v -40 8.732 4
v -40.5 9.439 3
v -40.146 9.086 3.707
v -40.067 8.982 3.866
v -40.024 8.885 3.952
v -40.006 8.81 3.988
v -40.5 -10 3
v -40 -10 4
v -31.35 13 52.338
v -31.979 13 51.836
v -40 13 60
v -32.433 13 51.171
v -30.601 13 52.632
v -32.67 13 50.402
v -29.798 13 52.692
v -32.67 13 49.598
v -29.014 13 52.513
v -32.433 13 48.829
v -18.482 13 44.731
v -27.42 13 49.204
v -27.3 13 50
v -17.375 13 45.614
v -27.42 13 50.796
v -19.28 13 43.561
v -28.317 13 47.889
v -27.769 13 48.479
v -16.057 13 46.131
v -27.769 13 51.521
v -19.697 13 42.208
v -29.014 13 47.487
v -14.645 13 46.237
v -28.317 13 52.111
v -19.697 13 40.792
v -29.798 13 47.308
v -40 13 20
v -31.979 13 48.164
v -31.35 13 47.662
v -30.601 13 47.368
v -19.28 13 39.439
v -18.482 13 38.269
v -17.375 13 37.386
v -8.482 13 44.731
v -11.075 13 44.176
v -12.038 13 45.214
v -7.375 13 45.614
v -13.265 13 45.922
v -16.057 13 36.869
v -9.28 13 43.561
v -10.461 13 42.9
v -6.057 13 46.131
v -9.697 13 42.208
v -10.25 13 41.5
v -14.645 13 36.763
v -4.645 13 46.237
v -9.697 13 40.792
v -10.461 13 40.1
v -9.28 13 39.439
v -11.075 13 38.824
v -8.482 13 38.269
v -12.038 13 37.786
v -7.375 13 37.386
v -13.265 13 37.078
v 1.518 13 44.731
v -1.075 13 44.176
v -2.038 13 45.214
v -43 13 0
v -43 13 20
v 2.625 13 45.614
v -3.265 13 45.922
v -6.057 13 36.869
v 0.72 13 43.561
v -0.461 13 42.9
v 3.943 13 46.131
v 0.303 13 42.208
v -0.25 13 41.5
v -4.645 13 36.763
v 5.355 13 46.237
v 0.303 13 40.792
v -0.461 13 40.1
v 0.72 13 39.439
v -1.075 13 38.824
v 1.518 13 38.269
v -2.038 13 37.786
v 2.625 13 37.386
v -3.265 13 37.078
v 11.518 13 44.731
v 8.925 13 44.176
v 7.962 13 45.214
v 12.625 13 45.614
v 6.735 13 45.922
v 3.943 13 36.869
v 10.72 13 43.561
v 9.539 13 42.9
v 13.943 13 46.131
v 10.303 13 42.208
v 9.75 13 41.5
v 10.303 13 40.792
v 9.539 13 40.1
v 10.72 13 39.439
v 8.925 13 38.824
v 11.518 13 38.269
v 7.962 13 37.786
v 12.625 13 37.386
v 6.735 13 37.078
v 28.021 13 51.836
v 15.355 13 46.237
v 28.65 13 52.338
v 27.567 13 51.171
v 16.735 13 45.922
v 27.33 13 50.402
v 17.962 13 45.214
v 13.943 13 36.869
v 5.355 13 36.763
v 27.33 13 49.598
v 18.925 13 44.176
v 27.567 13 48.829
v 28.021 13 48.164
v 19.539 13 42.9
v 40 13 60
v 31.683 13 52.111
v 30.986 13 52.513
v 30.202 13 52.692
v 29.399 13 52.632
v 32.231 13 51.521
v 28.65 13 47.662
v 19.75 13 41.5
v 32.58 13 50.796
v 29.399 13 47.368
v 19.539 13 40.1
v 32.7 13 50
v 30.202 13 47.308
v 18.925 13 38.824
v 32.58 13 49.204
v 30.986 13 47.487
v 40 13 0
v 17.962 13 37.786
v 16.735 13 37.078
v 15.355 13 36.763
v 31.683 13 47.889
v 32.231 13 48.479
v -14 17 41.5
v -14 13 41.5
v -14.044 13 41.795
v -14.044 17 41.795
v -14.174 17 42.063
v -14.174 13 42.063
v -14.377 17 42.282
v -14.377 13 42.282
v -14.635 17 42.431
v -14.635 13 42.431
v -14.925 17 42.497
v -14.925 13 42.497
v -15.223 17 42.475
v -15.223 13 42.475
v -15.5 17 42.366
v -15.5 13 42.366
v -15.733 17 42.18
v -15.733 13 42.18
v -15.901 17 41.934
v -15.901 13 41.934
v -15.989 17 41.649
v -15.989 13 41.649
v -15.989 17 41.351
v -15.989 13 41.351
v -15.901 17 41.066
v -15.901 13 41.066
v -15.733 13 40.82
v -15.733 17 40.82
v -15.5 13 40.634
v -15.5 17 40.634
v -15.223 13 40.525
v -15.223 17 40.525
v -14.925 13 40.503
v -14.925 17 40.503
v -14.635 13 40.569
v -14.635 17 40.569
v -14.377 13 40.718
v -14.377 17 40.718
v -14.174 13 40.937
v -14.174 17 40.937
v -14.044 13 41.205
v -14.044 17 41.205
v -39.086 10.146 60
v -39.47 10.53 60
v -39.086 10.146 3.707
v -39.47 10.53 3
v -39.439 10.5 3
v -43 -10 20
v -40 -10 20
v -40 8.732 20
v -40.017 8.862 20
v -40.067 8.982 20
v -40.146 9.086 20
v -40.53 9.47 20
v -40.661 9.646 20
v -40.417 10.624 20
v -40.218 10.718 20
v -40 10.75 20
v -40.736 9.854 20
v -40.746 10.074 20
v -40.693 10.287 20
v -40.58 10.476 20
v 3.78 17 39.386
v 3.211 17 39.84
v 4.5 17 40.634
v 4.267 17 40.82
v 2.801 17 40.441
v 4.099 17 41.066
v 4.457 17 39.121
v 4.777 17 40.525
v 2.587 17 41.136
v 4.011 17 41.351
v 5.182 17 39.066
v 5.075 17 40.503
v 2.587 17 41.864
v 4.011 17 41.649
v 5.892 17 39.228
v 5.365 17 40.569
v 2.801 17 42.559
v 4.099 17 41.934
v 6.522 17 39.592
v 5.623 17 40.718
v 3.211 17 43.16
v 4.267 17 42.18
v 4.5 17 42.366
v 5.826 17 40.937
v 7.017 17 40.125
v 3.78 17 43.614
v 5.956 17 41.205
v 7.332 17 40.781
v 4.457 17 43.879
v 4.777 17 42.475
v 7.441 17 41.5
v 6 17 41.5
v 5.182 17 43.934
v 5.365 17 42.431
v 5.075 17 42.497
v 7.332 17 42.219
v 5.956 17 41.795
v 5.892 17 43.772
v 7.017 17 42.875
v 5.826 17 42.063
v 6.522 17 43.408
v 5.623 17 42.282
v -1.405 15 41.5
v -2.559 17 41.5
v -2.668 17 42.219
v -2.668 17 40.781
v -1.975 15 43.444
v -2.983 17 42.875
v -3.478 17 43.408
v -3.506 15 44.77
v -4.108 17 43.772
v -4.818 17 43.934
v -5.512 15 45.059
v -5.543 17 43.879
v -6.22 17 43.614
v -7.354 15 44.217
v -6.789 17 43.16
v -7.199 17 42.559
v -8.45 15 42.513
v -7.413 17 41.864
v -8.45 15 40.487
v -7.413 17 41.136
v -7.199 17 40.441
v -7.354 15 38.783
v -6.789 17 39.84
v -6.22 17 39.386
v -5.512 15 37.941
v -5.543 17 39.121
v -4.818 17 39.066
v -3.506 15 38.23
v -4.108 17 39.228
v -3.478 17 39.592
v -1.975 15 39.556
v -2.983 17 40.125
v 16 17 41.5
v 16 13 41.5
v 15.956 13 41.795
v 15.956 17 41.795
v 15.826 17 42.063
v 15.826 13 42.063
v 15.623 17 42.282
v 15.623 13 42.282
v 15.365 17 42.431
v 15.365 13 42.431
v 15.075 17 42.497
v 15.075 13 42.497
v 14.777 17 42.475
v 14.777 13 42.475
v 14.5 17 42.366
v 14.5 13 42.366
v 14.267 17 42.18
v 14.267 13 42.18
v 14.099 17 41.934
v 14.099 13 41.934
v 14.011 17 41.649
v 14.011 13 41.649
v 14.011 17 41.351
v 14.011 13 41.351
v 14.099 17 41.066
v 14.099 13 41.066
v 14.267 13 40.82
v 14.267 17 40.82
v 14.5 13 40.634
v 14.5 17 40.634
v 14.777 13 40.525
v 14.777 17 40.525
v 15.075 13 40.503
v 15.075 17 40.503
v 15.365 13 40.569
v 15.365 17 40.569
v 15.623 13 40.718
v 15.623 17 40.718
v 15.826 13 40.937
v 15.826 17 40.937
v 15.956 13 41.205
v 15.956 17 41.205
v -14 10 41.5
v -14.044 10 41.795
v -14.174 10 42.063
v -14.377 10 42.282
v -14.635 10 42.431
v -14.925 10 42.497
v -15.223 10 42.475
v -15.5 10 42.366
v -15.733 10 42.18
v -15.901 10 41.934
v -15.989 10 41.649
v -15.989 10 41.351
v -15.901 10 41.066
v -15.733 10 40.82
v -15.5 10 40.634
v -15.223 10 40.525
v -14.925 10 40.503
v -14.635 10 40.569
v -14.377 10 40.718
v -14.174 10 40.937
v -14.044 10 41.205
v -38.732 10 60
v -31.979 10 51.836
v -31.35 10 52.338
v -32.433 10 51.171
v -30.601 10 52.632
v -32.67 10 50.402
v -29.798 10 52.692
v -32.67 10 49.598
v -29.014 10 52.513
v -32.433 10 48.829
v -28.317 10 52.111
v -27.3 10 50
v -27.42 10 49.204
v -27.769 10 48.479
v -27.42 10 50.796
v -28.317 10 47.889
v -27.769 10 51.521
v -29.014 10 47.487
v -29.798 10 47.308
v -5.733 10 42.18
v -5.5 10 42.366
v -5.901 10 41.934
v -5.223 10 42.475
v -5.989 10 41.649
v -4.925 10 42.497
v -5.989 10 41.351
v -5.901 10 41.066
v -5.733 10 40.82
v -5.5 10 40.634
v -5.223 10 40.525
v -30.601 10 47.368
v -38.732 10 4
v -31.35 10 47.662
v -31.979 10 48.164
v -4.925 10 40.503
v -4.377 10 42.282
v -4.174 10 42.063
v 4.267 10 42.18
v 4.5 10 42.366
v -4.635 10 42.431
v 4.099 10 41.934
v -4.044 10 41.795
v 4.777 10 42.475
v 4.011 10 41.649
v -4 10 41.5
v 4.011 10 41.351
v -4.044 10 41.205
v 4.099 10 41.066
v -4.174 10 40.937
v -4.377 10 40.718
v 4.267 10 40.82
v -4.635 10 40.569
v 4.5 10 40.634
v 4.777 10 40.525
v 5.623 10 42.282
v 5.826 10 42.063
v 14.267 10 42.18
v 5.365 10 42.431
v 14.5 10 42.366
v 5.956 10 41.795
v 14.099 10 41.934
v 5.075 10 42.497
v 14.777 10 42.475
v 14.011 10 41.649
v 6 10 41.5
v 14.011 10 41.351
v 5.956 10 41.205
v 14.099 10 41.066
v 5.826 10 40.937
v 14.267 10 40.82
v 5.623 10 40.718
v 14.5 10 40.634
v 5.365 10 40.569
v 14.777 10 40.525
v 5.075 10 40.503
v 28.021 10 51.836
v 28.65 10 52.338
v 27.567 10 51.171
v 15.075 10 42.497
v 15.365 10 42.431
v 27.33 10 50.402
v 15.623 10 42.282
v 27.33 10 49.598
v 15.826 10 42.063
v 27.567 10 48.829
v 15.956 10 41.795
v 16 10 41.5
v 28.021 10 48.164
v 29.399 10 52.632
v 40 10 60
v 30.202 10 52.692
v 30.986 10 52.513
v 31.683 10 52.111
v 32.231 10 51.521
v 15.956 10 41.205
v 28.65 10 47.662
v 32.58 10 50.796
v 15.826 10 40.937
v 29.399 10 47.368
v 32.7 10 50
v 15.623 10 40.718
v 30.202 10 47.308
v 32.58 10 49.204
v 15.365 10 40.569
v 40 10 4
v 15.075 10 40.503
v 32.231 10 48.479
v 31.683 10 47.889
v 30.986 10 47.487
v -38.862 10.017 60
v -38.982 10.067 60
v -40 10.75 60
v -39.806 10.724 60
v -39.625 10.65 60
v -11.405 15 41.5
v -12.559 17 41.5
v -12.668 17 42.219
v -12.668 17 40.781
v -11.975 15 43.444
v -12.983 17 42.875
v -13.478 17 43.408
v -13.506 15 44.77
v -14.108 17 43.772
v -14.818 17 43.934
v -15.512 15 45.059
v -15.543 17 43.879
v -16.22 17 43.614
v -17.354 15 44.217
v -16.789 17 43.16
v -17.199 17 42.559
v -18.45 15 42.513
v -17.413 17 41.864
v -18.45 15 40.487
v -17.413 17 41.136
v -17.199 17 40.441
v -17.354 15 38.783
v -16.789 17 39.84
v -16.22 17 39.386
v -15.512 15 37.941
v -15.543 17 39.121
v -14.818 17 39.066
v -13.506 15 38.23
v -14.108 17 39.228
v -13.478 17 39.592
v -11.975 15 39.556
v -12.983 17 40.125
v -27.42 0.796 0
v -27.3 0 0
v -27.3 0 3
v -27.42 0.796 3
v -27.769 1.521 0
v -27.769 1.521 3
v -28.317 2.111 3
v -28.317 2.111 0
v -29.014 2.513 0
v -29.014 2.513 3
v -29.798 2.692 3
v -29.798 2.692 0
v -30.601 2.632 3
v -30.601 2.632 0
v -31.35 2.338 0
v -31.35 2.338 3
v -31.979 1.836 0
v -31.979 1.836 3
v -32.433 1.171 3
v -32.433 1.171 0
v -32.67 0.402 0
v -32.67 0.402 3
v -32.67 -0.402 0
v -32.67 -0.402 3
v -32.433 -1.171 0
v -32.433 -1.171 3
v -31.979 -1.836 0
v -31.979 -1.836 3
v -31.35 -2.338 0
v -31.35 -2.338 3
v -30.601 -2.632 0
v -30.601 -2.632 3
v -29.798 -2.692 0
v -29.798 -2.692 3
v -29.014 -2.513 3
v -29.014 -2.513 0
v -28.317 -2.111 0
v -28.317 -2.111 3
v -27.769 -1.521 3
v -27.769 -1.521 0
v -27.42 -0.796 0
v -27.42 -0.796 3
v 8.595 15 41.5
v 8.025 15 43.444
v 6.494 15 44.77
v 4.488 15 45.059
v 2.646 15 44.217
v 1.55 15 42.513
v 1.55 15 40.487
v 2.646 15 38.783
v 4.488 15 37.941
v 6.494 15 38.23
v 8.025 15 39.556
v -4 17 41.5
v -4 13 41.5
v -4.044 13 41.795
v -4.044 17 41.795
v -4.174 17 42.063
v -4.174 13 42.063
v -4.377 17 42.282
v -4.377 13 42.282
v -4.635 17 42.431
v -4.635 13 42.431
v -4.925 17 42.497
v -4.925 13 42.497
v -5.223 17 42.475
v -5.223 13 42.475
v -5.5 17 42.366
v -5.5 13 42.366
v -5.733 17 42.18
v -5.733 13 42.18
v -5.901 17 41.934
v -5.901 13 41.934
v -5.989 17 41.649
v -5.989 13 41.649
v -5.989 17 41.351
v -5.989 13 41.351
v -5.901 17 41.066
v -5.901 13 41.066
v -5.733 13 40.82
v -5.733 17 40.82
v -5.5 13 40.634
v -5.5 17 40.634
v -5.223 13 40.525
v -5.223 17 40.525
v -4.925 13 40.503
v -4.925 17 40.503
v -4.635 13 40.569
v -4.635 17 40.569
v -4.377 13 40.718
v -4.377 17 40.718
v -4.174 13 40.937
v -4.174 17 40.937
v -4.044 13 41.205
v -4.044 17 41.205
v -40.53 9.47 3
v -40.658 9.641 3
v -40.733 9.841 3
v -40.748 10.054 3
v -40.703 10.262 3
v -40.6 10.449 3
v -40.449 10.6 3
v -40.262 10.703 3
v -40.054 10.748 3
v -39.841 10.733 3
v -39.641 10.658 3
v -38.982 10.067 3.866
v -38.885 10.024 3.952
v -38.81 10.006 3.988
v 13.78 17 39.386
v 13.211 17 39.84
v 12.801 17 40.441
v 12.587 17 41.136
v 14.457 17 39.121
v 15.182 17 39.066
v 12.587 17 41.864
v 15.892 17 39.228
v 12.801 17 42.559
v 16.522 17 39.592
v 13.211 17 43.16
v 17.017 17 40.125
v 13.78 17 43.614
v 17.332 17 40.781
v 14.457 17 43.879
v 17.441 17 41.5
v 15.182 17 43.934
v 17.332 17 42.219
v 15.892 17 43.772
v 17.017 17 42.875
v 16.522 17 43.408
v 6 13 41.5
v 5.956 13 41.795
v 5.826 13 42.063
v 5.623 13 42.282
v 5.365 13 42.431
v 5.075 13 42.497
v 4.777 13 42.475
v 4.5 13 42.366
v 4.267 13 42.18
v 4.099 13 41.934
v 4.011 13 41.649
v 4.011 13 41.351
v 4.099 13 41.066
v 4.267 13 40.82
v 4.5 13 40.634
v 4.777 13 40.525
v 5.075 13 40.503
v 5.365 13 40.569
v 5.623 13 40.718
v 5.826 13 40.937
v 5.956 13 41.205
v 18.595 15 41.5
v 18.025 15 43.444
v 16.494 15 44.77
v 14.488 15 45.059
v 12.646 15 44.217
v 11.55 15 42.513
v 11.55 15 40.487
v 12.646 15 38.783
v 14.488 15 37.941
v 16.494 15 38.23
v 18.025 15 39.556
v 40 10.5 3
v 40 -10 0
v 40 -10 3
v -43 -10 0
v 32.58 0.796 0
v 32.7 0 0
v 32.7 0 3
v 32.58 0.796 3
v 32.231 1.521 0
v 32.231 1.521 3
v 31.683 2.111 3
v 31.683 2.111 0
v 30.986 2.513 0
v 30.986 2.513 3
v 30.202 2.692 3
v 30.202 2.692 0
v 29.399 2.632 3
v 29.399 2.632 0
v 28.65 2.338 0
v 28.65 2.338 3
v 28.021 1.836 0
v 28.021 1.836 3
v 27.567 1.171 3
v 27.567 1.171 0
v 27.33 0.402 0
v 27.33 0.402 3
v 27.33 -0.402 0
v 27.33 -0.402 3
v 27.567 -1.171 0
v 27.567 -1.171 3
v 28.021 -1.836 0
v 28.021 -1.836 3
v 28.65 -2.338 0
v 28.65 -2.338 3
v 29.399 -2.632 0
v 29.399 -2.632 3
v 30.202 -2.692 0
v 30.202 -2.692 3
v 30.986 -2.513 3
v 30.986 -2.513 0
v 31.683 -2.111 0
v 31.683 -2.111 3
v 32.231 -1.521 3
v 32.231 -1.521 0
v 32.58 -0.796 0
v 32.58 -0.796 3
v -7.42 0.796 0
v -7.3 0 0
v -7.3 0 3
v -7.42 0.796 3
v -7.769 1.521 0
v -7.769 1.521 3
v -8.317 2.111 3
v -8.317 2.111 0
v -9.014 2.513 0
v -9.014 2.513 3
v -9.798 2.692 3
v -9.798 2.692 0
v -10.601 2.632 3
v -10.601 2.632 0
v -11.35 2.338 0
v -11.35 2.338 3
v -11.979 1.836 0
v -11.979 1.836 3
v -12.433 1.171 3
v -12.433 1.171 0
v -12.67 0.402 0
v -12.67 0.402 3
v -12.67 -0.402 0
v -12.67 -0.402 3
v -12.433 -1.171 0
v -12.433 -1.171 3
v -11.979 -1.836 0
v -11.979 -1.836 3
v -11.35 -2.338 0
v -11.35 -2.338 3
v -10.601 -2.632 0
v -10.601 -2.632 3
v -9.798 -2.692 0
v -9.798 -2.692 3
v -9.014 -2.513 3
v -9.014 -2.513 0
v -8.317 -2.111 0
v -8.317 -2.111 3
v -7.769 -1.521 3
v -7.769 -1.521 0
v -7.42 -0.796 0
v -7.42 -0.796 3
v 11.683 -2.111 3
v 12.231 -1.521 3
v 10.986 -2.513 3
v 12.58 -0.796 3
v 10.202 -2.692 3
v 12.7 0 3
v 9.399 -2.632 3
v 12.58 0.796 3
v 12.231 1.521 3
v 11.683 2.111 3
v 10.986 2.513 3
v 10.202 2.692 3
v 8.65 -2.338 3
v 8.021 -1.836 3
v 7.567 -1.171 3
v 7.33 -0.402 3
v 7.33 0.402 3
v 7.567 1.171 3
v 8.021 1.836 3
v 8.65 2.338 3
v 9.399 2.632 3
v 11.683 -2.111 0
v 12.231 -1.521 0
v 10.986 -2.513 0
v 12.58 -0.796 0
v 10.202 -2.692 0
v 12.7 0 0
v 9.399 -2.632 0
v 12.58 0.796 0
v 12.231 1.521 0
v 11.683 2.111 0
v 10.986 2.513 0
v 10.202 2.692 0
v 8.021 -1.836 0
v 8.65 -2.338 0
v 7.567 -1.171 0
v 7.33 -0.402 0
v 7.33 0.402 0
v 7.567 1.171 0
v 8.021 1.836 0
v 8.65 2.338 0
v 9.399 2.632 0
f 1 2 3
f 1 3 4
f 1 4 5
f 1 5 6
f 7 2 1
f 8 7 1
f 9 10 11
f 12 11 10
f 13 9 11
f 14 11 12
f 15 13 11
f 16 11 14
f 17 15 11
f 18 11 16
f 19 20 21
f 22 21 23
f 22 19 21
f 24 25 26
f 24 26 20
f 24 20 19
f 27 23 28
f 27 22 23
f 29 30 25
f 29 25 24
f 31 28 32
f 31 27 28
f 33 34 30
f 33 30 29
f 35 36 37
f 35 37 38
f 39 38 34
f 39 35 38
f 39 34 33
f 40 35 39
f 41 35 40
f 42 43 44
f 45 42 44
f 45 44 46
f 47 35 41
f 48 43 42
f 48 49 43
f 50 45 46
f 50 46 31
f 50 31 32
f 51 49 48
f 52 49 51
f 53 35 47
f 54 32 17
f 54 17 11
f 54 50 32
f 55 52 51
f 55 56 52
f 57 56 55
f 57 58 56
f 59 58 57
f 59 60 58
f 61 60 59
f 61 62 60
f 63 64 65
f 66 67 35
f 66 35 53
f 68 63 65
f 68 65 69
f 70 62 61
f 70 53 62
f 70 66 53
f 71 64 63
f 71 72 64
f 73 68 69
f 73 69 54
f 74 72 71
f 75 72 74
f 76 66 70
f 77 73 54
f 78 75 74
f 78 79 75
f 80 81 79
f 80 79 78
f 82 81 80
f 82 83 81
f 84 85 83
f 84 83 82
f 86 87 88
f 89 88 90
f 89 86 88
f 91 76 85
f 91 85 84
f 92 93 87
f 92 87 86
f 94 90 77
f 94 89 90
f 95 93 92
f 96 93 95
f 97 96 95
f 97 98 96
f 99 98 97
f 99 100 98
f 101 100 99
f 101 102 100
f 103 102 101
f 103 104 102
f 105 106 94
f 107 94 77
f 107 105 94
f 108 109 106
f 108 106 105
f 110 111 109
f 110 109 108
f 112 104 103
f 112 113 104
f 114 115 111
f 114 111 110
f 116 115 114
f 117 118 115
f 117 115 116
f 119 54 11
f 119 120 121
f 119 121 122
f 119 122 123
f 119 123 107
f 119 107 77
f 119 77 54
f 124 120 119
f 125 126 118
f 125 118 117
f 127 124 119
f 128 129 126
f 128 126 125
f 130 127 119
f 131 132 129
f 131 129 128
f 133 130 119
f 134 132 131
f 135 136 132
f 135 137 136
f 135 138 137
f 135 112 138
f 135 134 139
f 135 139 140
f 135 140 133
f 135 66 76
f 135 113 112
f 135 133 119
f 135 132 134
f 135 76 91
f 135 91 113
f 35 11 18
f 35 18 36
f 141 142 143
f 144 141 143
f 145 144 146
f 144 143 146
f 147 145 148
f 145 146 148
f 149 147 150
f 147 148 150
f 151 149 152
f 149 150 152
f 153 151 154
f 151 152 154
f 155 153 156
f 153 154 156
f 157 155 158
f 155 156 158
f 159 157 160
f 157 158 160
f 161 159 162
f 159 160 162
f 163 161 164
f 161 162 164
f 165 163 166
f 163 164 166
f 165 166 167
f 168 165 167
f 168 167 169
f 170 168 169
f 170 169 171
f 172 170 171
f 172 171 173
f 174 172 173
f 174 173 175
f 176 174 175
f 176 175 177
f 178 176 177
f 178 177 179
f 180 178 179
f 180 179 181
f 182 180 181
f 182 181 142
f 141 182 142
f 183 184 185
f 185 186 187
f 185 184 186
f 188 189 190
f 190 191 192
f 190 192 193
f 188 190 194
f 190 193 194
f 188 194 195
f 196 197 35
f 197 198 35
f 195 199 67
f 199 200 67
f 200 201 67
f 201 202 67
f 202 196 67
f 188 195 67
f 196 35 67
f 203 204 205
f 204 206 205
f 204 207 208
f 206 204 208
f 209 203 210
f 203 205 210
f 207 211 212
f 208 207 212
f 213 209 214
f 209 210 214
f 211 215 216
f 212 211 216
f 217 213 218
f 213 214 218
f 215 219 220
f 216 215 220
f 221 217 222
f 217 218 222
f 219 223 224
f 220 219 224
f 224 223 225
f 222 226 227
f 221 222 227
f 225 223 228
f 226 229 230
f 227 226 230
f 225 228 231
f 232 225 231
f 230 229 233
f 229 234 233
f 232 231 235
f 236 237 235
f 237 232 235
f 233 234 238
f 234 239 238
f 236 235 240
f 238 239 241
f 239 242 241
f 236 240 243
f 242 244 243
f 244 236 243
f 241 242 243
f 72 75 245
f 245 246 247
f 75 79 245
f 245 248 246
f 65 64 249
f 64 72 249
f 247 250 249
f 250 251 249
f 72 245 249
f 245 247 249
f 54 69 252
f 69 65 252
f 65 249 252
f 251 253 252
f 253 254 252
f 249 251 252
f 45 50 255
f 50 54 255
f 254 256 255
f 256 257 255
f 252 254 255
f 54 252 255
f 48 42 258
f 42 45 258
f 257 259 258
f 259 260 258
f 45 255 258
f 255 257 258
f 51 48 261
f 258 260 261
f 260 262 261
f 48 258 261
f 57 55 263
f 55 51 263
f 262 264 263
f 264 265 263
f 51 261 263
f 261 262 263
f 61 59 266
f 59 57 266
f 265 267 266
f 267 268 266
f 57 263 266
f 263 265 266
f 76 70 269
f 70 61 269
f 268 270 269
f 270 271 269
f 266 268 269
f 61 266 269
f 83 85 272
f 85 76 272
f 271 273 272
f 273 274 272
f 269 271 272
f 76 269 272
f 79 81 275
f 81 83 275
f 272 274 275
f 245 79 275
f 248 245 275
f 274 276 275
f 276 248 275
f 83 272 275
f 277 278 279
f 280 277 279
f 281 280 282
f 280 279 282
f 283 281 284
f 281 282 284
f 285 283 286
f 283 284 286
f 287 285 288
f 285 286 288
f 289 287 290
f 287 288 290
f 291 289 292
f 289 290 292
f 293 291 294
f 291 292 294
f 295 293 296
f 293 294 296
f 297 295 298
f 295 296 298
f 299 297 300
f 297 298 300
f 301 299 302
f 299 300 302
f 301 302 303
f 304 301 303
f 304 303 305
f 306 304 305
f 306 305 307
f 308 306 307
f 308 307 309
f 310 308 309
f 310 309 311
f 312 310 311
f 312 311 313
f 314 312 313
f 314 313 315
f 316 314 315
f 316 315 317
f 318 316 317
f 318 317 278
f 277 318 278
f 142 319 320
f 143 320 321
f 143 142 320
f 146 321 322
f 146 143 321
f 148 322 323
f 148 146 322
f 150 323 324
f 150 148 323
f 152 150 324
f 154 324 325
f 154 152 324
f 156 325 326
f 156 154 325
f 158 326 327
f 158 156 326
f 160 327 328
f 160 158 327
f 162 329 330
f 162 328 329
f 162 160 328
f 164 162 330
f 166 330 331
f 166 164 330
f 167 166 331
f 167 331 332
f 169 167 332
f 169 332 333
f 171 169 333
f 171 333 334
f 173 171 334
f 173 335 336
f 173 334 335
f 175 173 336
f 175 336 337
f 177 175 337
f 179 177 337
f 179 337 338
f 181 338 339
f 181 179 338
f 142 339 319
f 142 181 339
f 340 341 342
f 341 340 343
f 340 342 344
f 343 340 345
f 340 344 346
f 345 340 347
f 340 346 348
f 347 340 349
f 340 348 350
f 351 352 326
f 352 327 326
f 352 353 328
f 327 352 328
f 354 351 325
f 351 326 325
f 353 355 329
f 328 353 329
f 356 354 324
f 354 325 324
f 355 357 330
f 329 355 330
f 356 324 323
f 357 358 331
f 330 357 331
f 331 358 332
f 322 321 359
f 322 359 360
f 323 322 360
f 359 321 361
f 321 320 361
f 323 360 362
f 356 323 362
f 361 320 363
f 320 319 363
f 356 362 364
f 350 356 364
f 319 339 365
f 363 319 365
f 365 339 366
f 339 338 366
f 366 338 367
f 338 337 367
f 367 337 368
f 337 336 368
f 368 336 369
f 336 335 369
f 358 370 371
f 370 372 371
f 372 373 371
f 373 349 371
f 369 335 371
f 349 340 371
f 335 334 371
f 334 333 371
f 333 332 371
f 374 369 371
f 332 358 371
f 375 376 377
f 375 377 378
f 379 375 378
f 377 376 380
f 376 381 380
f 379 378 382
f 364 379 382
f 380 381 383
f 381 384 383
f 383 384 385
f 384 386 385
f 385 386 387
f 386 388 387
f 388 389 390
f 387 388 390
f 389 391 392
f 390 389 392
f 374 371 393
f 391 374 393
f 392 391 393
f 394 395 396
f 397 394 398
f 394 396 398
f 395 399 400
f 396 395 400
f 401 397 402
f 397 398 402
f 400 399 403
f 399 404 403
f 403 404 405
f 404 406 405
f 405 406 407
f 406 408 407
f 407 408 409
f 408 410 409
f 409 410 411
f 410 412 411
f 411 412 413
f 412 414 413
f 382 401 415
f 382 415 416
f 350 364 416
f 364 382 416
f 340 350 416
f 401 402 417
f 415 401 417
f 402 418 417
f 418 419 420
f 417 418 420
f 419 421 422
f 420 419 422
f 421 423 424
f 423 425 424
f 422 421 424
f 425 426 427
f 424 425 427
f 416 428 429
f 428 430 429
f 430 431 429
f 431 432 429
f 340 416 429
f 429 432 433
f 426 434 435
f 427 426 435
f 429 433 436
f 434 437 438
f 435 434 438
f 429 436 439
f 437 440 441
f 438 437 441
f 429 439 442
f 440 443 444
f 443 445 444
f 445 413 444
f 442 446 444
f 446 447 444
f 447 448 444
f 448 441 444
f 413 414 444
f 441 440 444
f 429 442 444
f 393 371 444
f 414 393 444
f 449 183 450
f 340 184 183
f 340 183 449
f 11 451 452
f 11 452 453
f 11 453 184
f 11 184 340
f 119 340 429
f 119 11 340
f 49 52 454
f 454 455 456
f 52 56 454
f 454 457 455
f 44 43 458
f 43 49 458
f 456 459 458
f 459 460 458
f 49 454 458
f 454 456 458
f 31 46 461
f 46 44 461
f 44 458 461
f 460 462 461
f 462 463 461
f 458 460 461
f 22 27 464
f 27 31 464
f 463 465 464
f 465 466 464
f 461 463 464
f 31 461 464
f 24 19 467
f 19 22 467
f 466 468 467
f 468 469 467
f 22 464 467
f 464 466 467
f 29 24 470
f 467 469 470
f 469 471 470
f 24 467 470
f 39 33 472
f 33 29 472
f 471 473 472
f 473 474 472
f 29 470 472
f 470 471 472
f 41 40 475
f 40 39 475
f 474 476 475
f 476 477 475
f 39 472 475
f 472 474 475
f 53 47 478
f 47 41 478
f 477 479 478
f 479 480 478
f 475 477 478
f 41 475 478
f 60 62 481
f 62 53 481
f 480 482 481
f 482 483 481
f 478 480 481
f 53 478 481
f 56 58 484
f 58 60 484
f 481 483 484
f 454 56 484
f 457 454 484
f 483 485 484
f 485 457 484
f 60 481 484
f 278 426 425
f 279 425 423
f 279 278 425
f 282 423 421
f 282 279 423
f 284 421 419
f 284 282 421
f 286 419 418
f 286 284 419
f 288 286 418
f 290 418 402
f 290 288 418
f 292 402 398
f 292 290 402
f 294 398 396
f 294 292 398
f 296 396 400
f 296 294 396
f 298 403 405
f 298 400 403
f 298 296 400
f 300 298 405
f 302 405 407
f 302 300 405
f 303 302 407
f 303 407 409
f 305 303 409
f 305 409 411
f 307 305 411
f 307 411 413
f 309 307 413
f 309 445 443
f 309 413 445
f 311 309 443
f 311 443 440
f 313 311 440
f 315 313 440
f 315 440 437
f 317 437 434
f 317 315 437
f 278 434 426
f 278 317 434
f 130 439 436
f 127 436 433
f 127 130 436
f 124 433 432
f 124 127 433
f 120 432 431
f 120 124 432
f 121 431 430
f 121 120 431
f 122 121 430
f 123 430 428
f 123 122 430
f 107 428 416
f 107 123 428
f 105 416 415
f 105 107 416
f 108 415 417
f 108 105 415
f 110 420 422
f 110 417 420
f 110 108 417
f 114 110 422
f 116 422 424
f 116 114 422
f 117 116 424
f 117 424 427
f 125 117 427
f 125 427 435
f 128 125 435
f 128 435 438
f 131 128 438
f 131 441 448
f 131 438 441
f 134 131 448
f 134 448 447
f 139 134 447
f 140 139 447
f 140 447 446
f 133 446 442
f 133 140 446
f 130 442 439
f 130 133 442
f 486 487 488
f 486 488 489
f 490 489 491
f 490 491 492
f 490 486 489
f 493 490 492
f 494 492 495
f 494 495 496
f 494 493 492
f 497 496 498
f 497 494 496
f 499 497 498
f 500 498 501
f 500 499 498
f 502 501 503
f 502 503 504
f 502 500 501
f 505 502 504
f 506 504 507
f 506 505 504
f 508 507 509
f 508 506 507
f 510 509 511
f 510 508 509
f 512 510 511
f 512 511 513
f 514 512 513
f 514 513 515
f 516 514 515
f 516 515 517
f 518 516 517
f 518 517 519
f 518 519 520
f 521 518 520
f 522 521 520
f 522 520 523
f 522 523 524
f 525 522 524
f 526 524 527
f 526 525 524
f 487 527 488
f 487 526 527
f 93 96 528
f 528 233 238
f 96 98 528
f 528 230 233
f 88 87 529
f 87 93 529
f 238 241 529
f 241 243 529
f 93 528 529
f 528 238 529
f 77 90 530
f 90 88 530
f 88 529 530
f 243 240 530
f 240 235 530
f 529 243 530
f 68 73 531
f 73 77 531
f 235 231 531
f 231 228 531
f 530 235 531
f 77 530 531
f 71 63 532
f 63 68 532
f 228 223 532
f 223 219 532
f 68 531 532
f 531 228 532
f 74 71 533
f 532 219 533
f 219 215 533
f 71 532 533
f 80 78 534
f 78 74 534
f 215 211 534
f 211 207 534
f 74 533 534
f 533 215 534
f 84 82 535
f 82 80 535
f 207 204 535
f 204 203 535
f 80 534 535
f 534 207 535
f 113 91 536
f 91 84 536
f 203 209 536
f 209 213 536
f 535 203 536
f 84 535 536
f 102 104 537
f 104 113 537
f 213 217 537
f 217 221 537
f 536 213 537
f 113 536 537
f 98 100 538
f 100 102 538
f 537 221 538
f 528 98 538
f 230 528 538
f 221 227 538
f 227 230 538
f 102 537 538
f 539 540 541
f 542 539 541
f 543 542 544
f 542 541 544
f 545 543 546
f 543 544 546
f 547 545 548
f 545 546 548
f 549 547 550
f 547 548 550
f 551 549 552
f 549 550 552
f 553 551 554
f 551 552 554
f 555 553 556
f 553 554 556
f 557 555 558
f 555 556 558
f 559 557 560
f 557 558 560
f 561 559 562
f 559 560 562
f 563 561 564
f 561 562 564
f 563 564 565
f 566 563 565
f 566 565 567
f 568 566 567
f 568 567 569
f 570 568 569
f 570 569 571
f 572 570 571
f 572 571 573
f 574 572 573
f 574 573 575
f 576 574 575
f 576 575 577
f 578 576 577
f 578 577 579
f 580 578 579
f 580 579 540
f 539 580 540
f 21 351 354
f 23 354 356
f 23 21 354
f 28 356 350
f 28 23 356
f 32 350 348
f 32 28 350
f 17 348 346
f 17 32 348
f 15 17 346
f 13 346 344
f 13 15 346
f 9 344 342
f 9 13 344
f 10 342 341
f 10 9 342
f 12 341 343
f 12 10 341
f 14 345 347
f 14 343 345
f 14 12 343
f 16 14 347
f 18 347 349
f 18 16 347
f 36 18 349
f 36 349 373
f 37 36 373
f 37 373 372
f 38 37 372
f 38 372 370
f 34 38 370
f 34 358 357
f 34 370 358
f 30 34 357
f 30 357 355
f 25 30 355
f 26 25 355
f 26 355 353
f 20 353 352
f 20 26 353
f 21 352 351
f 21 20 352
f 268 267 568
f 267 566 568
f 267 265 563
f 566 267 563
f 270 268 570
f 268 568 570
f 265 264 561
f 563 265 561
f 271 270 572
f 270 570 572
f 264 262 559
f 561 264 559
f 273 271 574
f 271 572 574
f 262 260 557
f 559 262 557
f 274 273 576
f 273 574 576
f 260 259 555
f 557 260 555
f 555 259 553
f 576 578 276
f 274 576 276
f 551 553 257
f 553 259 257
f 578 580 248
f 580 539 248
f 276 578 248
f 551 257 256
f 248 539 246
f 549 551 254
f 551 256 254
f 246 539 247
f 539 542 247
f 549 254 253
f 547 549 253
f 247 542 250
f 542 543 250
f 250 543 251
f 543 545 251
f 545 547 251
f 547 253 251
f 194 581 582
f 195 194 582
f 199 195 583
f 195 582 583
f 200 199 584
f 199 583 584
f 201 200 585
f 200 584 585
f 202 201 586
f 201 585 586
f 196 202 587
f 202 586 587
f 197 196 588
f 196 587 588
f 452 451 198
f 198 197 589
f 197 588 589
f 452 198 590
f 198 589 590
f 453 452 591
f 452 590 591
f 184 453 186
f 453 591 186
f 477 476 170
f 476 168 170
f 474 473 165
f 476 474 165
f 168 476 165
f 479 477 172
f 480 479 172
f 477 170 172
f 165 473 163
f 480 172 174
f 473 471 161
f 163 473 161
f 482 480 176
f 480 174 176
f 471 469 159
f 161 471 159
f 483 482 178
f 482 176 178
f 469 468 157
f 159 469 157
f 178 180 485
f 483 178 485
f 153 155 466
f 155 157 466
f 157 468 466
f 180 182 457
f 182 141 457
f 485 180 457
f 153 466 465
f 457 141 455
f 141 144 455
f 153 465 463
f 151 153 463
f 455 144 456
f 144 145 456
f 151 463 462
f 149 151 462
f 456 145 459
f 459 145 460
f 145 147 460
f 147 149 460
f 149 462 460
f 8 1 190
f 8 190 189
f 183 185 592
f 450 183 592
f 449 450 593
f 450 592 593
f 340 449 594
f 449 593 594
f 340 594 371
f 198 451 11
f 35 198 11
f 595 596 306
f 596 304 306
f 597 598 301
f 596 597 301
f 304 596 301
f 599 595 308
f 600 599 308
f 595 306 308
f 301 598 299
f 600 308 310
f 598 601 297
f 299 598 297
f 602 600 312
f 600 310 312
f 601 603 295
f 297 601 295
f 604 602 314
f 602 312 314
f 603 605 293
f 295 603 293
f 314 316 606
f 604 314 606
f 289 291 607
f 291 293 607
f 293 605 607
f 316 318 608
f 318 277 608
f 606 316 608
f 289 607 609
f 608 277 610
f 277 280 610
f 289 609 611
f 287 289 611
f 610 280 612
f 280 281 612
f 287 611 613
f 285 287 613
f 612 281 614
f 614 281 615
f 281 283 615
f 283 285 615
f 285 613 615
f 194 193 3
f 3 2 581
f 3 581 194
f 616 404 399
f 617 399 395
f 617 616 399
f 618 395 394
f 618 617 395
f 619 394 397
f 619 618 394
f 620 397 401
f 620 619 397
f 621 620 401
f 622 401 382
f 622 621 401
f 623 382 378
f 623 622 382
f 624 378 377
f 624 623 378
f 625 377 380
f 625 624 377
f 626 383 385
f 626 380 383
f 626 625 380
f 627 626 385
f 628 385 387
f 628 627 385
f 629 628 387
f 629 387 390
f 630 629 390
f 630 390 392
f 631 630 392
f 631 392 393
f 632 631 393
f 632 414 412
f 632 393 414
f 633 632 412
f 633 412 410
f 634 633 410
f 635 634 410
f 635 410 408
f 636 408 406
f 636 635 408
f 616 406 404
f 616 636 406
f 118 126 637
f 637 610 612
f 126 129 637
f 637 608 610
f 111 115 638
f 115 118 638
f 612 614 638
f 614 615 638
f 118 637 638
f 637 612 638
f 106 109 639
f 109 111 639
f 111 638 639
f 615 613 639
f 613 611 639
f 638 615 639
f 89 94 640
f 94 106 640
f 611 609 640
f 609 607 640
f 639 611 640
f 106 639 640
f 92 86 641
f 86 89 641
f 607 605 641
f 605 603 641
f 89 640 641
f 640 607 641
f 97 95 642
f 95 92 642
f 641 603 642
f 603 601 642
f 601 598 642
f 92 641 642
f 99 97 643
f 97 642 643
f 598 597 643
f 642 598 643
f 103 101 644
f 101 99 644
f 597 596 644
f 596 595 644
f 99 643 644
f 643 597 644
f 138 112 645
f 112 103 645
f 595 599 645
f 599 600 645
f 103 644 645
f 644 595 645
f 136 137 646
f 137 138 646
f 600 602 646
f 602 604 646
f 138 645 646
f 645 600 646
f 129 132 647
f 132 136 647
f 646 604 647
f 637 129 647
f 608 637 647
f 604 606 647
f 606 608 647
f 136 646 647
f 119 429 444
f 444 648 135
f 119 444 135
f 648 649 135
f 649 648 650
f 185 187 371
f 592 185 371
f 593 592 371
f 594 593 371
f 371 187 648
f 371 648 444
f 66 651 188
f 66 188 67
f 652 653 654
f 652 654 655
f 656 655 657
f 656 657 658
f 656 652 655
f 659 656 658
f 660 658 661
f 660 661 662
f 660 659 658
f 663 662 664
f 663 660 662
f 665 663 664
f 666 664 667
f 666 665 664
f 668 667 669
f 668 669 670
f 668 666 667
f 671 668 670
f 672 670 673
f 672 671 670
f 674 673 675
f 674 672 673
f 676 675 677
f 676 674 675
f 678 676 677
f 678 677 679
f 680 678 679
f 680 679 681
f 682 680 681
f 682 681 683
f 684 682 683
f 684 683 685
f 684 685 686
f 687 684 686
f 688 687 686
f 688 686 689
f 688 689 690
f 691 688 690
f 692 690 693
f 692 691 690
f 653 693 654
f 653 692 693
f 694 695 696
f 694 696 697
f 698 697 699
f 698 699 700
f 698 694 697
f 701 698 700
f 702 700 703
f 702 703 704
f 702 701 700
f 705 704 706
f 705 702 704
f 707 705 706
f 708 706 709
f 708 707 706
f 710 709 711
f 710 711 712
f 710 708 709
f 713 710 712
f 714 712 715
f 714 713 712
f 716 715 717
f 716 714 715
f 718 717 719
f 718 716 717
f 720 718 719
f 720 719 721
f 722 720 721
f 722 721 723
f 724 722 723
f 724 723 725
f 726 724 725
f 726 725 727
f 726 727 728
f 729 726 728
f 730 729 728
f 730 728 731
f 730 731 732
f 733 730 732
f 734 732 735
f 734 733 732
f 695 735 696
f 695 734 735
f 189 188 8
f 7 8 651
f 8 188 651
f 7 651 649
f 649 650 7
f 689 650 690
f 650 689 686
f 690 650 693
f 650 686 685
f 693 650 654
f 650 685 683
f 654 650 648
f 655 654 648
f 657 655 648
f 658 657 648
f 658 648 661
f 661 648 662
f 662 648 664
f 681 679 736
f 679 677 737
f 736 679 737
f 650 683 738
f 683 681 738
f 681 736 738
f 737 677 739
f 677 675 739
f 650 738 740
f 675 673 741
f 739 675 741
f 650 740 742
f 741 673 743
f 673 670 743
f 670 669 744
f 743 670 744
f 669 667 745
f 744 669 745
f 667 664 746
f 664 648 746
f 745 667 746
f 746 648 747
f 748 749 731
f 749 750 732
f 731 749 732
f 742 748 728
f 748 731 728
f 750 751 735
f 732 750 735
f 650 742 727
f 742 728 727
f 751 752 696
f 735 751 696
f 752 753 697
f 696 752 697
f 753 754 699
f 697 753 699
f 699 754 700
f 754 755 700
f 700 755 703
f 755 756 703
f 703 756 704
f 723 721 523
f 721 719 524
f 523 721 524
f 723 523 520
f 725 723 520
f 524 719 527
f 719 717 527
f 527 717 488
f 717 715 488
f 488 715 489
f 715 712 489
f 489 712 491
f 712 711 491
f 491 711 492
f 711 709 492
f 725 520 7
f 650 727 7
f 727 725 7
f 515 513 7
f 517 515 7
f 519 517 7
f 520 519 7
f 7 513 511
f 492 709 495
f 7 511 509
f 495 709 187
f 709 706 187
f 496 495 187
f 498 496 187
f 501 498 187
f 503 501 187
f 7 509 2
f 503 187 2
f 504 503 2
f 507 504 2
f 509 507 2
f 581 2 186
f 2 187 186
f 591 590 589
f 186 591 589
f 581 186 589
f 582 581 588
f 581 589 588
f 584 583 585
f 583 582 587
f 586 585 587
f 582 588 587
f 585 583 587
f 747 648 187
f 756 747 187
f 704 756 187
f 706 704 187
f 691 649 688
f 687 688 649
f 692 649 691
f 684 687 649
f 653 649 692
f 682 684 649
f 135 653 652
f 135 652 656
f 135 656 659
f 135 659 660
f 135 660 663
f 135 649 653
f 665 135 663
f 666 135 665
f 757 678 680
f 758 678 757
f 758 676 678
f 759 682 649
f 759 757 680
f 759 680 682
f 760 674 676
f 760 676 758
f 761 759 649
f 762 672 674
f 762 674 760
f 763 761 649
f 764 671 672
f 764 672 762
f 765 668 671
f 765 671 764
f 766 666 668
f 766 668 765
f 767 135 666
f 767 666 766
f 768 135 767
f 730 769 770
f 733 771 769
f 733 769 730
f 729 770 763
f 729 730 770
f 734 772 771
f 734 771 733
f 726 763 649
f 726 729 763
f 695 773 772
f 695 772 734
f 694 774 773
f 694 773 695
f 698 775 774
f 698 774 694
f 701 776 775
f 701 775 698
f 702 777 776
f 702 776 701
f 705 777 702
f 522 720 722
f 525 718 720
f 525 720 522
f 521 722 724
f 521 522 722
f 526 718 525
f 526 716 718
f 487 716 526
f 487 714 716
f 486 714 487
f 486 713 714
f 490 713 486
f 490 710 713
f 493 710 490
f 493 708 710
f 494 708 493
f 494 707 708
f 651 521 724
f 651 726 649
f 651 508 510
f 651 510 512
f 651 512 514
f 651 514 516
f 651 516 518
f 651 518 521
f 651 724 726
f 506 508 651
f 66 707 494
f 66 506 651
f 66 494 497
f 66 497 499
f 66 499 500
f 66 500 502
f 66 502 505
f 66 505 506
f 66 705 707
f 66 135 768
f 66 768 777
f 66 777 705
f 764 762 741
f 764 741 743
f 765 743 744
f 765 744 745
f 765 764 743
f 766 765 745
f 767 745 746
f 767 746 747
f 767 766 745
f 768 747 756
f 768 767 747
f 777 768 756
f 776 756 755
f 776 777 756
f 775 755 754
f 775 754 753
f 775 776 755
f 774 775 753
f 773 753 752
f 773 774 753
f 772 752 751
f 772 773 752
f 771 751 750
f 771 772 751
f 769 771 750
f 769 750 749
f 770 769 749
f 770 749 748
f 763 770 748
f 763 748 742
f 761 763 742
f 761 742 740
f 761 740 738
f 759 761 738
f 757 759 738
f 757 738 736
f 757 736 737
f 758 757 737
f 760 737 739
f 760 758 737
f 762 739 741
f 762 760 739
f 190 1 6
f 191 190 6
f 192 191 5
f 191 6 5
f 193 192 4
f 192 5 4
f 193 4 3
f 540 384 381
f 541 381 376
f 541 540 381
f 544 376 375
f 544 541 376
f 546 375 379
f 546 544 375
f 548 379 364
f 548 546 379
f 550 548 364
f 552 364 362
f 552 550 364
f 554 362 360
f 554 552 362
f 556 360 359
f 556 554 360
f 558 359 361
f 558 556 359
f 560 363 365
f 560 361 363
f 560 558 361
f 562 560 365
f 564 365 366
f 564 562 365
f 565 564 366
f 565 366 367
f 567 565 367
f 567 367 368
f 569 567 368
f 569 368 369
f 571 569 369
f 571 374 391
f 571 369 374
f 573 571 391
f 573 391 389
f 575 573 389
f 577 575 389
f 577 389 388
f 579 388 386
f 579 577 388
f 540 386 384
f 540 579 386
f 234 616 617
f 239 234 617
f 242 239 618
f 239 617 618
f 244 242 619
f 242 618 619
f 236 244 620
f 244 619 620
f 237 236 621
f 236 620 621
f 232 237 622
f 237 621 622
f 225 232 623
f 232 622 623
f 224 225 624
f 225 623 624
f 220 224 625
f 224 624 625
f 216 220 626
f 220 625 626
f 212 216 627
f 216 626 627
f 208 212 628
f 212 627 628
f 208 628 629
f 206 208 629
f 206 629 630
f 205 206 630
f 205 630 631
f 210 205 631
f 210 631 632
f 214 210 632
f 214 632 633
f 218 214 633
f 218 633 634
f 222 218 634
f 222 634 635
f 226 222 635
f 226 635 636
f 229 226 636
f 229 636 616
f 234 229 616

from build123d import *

# Parameters (mm, degrees)
SKETCH1_W                      = 80
SKETCH1_H                      = 20
SKETCH1_R                      = 2.7
BOSS_EXTRUDE1_DEPTH            = 3
BOSS_EXTRUDE2_DEPTH            = 20
SKETCH2_W                      = 80
SKETCH2_H                      = 3
BOSS_EXTRUDE3_DEPTH            = 40
SKETCH3_R                      = 4.75
BOSS_EXTRUDE5_DEPTH            = 4
BOSS_EXTRUDE5_TAPER            = 30
CUT_EXTRUDE2_REACH             = 25
SKETCH3_6_R                    = 1
SKETCH3_6_R_2                  = 2.7
CUT_EXTRUDE2_DIRECTION_2_REACH = 6
CUT_EXTRUDE3_DEPTH             = 57
CUT_EXTRUDE4_DEPTH             = 20
CUT_EXTRUDE5_DEPTH             = 80


with BuildPart() as part:
    # Sketch1 → Boss-Extrude1 (new body)
    with BuildSketch(Plane.XY):
        Rectangle(SKETCH1_W, SKETCH1_H)
        with Locations((-30, 0)):
            Circle(SKETCH1_R, mode=Mode.SUBTRACT)
        with Locations((-10, 0)):
            Circle(SKETCH1_R, mode=Mode.SUBTRACT)
        with Locations((10, 0)):
            Circle(SKETCH1_R, mode=Mode.SUBTRACT)
        with Locations((30, 0)):
            Circle(SKETCH1_R, mode=Mode.SUBTRACT)
    extrude(amount=BOSS_EXTRUDE1_DEPTH)

    # Sketch1<3> → Boss-Extrude2 (add)
    with BuildSketch(Plane.XY):
        Polygon((40, 13), (40, 10), (-40, 10), (-40, -10), (-43, -10), (-43, 13), align=None)
    extrude(amount=BOSS_EXTRUDE2_DEPTH)

    # Sketch2 → Boss-Extrude3 (add)
    with BuildSketch(Plane.XY.offset(20)):
        with Locations((0, 11.5)):
            Rectangle(SKETCH2_W, SKETCH2_H)
    extrude(amount=BOSS_EXTRUDE3_DEPTH)

    # Sketch3 → Boss-Extrude5 (add)
    with BuildSketch(Plane.XZ.offset(-13)):
        with Locations((15, 41.5)):
            Circle(SKETCH3_R)
        with Locations((5, 41.5)):
            Circle(SKETCH3_R)
        with Locations((-5, 41.5)):
            Circle(SKETCH3_R)
        with Locations((-15, 41.5)):
            Circle(SKETCH3_R)
    extrude(amount=-BOSS_EXTRUDE5_DEPTH, taper=BOSS_EXTRUDE5_TAPER)

    # Cut-Extrude2: up to this face of the body (flat: up to its plane)
    cut_extrude2_end = Plane(part.part.faces().sort_by_distance((0, 10, 31.5))[0])
    # Sketch3<6> → Cut-Extrude2 (cut, up to the picked face)
    with BuildSketch(Plane.XZ.offset(-13), mode=Mode.PRIVATE) as cut_extrude2_sk1:
        with Locations((-15, 41.5)):
            Circle(SKETCH3_6_R)
    cut_extrude2_tool1 = split(extrude(cut_extrude2_sk1.sketch, amount=CUT_EXTRUDE2_REACH, mode=Mode.PRIVATE), bisect_by=cut_extrude2_end, keep=Keep.BOTH, mode=Mode.PRIVATE)
    add(cut_extrude2_tool1.solids().sort_by_distance((-15, 13, 41.5))[0], mode=Mode.SUBTRACT)
    # Sketch3<6> → Cut-Extrude2 (cut, up to the picked face)
    with BuildSketch(Plane.XZ.offset(-13), mode=Mode.PRIVATE) as cut_extrude2_sk2:
        with Locations((5, 41.5)):
            Circle(SKETCH3_6_R)
    cut_extrude2_tool2 = split(extrude(cut_extrude2_sk2.sketch, amount=CUT_EXTRUDE2_REACH, mode=Mode.PRIVATE), bisect_by=cut_extrude2_end, keep=Keep.BOTH, mode=Mode.PRIVATE)
    add(cut_extrude2_tool2.solids().sort_by_distance((5, 13, 41.5))[0], mode=Mode.SUBTRACT)
    # Sketch3<6> → Cut-Extrude2 (cut, up to the picked face)
    with BuildSketch(Plane.XZ.offset(-13), mode=Mode.PRIVATE) as cut_extrude2_sk3:
        with Locations((-30, 50)):
            Circle(SKETCH3_6_R_2)
    cut_extrude2_tool3 = split(extrude(cut_extrude2_sk3.sketch, amount=CUT_EXTRUDE2_REACH, mode=Mode.PRIVATE), bisect_by=cut_extrude2_end, keep=Keep.BOTH, mode=Mode.PRIVATE)
    add(cut_extrude2_tool3.solids().sort_by_distance((-30, 13, 50))[0], mode=Mode.SUBTRACT)
    # Sketch3<6> → Cut-Extrude2 (cut, up to the picked face)
    with BuildSketch(Plane.XZ.offset(-13), mode=Mode.PRIVATE) as cut_extrude2_sk4:
        with Locations((30, 50)):
            Circle(SKETCH3_6_R_2)
    cut_extrude2_tool4 = split(extrude(cut_extrude2_sk4.sketch, amount=CUT_EXTRUDE2_REACH, mode=Mode.PRIVATE), bisect_by=cut_extrude2_end, keep=Keep.BOTH, mode=Mode.PRIVATE)
    add(cut_extrude2_tool4.solids().sort_by_distance((30, 13, 50))[0], mode=Mode.SUBTRACT)
    # Sketch3<6> → Cut-Extrude2 (cut, up to the picked face)
    with BuildSketch(Plane.XZ.offset(-13), mode=Mode.PRIVATE) as cut_extrude2_sk5:
        with Locations((15, 41.5)):
            Circle(SKETCH3_6_R)
    cut_extrude2_tool5 = split(extrude(cut_extrude2_sk5.sketch, amount=CUT_EXTRUDE2_REACH, mode=Mode.PRIVATE), bisect_by=cut_extrude2_end, keep=Keep.BOTH, mode=Mode.PRIVATE)
    add(cut_extrude2_tool5.solids().sort_by_distance((15, 13, 41.5))[0], mode=Mode.SUBTRACT)
    # Sketch3<6> → Cut-Extrude2 (cut, up to the picked face)
    with BuildSketch(Plane.XZ.offset(-13), mode=Mode.PRIVATE) as cut_extrude2_sk6:
        with Locations((-5, 41.5)):
            Circle(SKETCH3_6_R)
    cut_extrude2_tool6 = split(extrude(cut_extrude2_sk6.sketch, amount=CUT_EXTRUDE2_REACH, mode=Mode.PRIVATE), bisect_by=cut_extrude2_end, keep=Keep.BOTH, mode=Mode.PRIVATE)
    add(cut_extrude2_tool6.solids().sort_by_distance((-5, 13, 41.5))[0], mode=Mode.SUBTRACT)

    # Cut-Extrude2 direction 2: up to this face of the body (flat: up to its plane)
    cut_extrude2_direction_2_end = Plane(part.part.faces().sort_by_distance((-15, 17, 41.5))[0])
    # Sketch3<6> → Cut-Extrude2 direction 2 (cut, up to the picked face)
    with BuildSketch(Plane.XZ.offset(-13), mode=Mode.PRIVATE) as cut_extrude2_direction_2_sk1:
        with Locations((-15, 41.5)):
            Circle(SKETCH3_6_R)
    cut_extrude2_direction_2_tool1 = split(extrude(cut_extrude2_direction_2_sk1.sketch, amount=-CUT_EXTRUDE2_DIRECTION_2_REACH, mode=Mode.PRIVATE), bisect_by=cut_extrude2_direction_2_end, keep=Keep.BOTH, mode=Mode.PRIVATE)
    add(cut_extrude2_direction_2_tool1.solids().sort_by_distance((-15, 13, 41.5))[0], mode=Mode.SUBTRACT)
    # Sketch3<6> → Cut-Extrude2 direction 2 (cut, up to the picked face)
    with BuildSketch(Plane.XZ.offset(-13), mode=Mode.PRIVATE) as cut_extrude2_direction_2_sk2:
        with Locations((5, 41.5)):
            Circle(SKETCH3_6_R)
    cut_extrude2_direction_2_tool2 = split(extrude(cut_extrude2_direction_2_sk2.sketch, amount=-CUT_EXTRUDE2_DIRECTION_2_REACH, mode=Mode.PRIVATE), bisect_by=cut_extrude2_direction_2_end, keep=Keep.BOTH, mode=Mode.PRIVATE)
    add(cut_extrude2_direction_2_tool2.solids().sort_by_distance((5, 13, 41.5))[0], mode=Mode.SUBTRACT)
    # Sketch3<6> → Cut-Extrude2 direction 2 (cut, up to the picked face)
    with BuildSketch(Plane.XZ.offset(-13), mode=Mode.PRIVATE) as cut_extrude2_direction_2_sk3:
        with Locations((-30, 50)):
            Circle(SKETCH3_6_R_2)
    cut_extrude2_direction_2_tool3 = split(extrude(cut_extrude2_direction_2_sk3.sketch, amount=-CUT_EXTRUDE2_DIRECTION_2_REACH, mode=Mode.PRIVATE), bisect_by=cut_extrude2_direction_2_end, keep=Keep.BOTH, mode=Mode.PRIVATE)
    add(cut_extrude2_direction_2_tool3.solids().sort_by_distance((-30, 13, 50))[0], mode=Mode.SUBTRACT)
    # Sketch3<6> → Cut-Extrude2 direction 2 (cut, up to the picked face)
    with BuildSketch(Plane.XZ.offset(-13), mode=Mode.PRIVATE) as cut_extrude2_direction_2_sk4:
        with Locations((30, 50)):
            Circle(SKETCH3_6_R_2)
    cut_extrude2_direction_2_tool4 = split(extrude(cut_extrude2_direction_2_sk4.sketch, amount=-CUT_EXTRUDE2_DIRECTION_2_REACH, mode=Mode.PRIVATE), bisect_by=cut_extrude2_direction_2_end, keep=Keep.BOTH, mode=Mode.PRIVATE)
    add(cut_extrude2_direction_2_tool4.solids().sort_by_distance((30, 13, 50))[0], mode=Mode.SUBTRACT)
    # Sketch3<6> → Cut-Extrude2 direction 2 (cut, up to the picked face)
    with BuildSketch(Plane.XZ.offset(-13), mode=Mode.PRIVATE) as cut_extrude2_direction_2_sk5:
        with Locations((15, 41.5)):
            Circle(SKETCH3_6_R)
    cut_extrude2_direction_2_tool5 = split(extrude(cut_extrude2_direction_2_sk5.sketch, amount=-CUT_EXTRUDE2_DIRECTION_2_REACH, mode=Mode.PRIVATE), bisect_by=cut_extrude2_direction_2_end, keep=Keep.BOTH, mode=Mode.PRIVATE)
    add(cut_extrude2_direction_2_tool5.solids().sort_by_distance((15, 13, 41.5))[0], mode=Mode.SUBTRACT)
    # Sketch3<6> → Cut-Extrude2 direction 2 (cut, up to the picked face)
    with BuildSketch(Plane.XZ.offset(-13), mode=Mode.PRIVATE) as cut_extrude2_direction_2_sk6:
        with Locations((-5, 41.5)):
            Circle(SKETCH3_6_R)
    cut_extrude2_direction_2_tool6 = split(extrude(cut_extrude2_direction_2_sk6.sketch, amount=-CUT_EXTRUDE2_DIRECTION_2_REACH, mode=Mode.PRIVATE), bisect_by=cut_extrude2_direction_2_end, keep=Keep.BOTH, mode=Mode.PRIVATE)
    add(cut_extrude2_direction_2_tool6.solids().sort_by_distance((-5, 13, 41.5))[0], mode=Mode.SUBTRACT)

    # Sketch4 → Cut-Extrude3 (cut)
    with BuildSketch(Plane.XY.offset(3)):
        with BuildLine():
            Line((-39.469669914, 10.530330086), (-39.085786438, 10.146446609))
            ThreePointArc((-39.085786438, 10.146446609), (-38.923574763, 10.038060234), (-38.732233047, 10))
            Line((-38.732233047, 10), (-40, 8.732233047))
            ThreePointArc((-40, 8.732233047), (-40.038060234, 8.923574763), (-40.146446609, 9.085786438))
            Line((-40.146446609, 9.085786438), (-40.530330086, 9.469669914))
            ThreePointArc((-40.530330086, 9.469669914), (-40.530330086, 10.530330086), (-39.469669914, 10.530330086))
        make_face()
    extrude(amount=CUT_EXTRUDE3_DEPTH, mode=Mode.SUBTRACT)

    # Sketch5 → Cut-Extrude4 (cut)
    with BuildSketch(Plane.XZ.offset(10)):
        Polygon((-40, 3), (-40.5, 3), (-40, 4), align=None)
    extrude(amount=-CUT_EXTRUDE4_DEPTH, mode=Mode.SUBTRACT)

    # Sketch6 → Cut-Extrude5 (cut)
    with BuildSketch(Plane(origin=(40, 0, 0), x_dir=(0, 0, -1), z_dir=(1, 0, 0))):
        Polygon((-3, 10), (-3, 10.5), (-4, 10), align=None)
    extrude(amount=-CUT_EXTRUDE5_DEPTH, mode=Mode.SUBTRACT)


solid = part.part
